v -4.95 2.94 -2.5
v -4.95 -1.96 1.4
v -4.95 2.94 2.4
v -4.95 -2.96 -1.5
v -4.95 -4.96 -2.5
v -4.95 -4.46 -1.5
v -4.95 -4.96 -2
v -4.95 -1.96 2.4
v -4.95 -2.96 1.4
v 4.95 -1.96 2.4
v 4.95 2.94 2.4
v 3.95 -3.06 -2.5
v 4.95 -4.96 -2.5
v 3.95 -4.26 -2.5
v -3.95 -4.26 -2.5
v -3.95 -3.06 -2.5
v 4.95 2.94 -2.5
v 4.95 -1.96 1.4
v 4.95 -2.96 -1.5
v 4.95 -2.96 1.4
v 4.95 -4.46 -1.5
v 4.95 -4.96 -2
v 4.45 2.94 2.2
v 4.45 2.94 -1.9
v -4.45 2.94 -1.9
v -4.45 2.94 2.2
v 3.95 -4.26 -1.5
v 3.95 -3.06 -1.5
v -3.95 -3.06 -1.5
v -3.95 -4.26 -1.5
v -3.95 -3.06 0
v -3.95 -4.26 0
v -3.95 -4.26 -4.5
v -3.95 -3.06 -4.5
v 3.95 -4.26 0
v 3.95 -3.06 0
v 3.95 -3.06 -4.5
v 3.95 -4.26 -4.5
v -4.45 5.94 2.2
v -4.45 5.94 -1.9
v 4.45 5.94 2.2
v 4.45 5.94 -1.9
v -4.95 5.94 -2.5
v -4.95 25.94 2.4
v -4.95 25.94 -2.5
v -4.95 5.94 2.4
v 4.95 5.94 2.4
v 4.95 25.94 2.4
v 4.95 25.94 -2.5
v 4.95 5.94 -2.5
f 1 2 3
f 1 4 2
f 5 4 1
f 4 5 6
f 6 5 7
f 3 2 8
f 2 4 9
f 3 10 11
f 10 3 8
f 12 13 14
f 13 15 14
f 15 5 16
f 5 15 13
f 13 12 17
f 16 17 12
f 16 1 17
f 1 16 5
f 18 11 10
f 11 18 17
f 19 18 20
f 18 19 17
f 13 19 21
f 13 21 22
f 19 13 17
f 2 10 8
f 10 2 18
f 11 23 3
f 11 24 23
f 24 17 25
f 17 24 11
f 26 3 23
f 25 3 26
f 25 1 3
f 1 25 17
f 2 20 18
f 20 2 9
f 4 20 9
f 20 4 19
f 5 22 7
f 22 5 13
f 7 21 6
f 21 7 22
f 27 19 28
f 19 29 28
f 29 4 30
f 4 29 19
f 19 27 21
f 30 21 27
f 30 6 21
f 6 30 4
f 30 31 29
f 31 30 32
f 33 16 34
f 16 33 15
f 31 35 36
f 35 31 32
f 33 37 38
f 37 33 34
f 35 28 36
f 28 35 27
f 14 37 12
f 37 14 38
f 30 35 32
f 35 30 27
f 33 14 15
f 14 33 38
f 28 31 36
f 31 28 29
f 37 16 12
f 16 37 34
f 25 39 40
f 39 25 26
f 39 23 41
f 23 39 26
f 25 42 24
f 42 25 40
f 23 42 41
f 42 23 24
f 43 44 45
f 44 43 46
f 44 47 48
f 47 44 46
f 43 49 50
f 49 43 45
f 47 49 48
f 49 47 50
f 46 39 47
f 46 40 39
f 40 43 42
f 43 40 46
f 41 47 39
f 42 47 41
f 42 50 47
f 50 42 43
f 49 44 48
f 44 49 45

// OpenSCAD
N=3;
A=2.4+N*2.5;
rotate([0,0,180])
translate([-A/2,-2.94,-2.5])
{
	cube([A,4.9,4.9]);
	cube([A,5.9,3.9]);
	hull()
	{
		cube([A,7.4,1]);
		cube([A,7.9,0.5]);
	}
	translate([1,6,-2])cube([A-2,1.2,4.5]); // Assumes cropped pins
	// Plug
	translate([0.5,-20,0.6])cube([A-1,21,4.1]);
	translate([0,-23,0])cube([A,20,4.9]);
}
